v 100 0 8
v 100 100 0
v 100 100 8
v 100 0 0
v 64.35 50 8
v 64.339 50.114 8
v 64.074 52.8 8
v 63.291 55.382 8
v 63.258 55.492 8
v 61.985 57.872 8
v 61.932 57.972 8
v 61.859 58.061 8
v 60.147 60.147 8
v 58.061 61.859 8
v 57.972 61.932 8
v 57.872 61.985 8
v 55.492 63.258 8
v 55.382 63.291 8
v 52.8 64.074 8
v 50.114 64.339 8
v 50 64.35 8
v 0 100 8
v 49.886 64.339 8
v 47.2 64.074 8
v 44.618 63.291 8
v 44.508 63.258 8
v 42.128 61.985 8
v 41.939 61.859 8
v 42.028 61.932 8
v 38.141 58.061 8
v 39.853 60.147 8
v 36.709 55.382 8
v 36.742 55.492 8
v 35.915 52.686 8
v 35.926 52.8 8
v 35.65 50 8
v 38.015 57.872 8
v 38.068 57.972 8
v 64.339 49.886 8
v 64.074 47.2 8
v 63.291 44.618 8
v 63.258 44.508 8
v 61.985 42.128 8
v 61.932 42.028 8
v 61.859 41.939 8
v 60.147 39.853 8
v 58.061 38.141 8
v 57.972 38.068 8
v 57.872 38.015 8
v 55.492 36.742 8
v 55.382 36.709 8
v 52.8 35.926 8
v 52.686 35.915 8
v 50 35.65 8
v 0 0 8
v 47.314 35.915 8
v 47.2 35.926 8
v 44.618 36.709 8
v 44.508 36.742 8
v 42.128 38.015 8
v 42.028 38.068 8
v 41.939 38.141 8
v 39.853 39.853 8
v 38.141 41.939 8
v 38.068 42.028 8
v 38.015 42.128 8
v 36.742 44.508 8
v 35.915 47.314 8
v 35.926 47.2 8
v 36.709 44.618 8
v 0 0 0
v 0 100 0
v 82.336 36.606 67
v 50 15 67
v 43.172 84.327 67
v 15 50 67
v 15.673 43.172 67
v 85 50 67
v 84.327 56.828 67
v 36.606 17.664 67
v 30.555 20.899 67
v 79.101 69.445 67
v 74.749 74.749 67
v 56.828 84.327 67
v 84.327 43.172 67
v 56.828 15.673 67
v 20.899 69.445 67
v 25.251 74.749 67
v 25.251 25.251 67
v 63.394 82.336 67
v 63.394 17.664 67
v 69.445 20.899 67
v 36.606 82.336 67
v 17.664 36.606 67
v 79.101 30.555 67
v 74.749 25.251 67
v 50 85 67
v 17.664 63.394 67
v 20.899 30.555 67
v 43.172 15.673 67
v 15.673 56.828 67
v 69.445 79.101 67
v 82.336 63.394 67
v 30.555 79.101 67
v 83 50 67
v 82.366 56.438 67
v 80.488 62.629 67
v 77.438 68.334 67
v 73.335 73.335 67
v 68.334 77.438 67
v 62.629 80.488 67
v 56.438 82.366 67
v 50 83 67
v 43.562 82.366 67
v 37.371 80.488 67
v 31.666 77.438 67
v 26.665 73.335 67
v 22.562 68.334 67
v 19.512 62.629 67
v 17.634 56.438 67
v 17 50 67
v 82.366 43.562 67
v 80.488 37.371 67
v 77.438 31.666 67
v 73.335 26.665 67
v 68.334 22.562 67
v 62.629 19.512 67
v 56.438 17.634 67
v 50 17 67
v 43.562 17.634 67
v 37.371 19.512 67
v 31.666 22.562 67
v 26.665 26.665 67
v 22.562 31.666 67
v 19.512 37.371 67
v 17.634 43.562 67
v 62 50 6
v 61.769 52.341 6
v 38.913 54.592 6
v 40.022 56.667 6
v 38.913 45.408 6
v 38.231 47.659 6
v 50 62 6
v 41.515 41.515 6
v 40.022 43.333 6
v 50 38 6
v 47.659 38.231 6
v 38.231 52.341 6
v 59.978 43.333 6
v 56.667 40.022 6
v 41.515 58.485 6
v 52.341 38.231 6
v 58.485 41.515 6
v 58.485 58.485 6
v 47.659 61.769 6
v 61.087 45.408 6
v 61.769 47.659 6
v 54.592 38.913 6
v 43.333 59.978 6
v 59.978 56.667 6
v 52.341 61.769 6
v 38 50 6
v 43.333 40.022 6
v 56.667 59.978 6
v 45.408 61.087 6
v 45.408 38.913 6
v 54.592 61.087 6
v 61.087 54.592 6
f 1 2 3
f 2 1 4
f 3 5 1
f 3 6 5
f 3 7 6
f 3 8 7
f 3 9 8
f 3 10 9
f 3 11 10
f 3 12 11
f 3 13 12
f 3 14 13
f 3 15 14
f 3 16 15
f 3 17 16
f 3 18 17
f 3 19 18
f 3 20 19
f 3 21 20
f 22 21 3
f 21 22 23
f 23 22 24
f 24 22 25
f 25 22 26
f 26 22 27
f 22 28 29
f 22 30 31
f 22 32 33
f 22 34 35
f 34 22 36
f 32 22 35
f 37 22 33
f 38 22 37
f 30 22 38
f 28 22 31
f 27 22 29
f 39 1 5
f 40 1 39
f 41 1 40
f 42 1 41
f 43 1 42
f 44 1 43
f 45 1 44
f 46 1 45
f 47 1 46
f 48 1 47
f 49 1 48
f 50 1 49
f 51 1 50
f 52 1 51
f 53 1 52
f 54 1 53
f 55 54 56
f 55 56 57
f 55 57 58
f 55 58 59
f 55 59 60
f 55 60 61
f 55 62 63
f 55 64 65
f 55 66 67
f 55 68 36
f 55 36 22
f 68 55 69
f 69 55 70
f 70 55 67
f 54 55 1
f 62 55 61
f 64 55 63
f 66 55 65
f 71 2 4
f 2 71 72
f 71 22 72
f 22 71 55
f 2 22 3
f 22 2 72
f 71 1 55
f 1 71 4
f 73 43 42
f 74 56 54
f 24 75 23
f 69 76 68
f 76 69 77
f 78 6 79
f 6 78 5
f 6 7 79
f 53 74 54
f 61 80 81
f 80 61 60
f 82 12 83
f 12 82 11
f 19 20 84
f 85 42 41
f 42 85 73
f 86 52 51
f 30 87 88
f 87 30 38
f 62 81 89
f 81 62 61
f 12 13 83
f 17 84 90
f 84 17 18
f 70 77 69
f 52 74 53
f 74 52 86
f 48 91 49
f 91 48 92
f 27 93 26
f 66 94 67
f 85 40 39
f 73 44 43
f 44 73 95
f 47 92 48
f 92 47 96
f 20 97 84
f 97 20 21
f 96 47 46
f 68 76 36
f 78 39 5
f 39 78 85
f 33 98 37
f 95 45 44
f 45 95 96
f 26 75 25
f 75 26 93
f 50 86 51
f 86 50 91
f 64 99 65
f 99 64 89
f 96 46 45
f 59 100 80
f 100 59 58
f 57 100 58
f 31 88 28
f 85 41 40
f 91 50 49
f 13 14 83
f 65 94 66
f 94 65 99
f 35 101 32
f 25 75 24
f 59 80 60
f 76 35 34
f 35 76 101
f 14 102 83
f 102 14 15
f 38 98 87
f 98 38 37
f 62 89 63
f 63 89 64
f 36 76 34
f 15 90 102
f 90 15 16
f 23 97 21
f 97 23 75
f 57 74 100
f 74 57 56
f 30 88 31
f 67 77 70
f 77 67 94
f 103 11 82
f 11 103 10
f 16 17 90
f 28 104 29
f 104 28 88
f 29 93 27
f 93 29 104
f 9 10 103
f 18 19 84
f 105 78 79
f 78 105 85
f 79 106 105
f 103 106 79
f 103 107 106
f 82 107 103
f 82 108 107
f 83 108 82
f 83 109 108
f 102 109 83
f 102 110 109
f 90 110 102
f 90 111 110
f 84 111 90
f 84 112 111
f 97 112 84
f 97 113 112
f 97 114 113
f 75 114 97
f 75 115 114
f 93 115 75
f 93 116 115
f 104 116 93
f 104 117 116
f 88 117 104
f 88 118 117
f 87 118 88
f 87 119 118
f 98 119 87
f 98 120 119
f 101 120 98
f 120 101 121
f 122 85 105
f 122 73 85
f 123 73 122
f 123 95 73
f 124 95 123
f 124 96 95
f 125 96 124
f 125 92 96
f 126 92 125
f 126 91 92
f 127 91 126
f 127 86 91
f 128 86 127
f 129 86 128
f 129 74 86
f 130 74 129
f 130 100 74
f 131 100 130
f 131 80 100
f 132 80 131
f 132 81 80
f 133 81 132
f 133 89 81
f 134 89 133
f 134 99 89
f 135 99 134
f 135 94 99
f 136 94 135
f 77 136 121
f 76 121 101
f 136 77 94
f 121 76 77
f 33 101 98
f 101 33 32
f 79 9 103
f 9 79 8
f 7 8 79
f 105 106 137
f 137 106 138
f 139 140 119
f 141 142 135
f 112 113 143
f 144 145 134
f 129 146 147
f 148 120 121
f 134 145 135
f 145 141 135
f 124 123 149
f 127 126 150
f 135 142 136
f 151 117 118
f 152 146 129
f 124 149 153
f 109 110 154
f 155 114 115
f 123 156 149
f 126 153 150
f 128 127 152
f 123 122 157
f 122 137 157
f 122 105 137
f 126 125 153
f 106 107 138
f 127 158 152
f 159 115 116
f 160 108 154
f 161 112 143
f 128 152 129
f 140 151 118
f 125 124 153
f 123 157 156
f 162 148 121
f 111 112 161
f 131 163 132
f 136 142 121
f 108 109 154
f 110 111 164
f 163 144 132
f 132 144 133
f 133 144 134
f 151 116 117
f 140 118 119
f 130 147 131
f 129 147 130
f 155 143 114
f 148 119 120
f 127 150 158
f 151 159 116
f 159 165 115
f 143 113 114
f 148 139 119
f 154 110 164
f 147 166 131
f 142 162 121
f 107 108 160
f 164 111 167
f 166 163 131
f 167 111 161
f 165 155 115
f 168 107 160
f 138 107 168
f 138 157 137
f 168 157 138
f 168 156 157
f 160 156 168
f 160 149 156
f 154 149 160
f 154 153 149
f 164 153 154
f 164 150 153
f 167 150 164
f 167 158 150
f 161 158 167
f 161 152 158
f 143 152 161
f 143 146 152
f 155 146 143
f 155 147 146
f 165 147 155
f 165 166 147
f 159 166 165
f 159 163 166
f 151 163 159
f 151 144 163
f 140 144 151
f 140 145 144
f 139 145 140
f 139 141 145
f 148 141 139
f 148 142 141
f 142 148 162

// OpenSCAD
$fn = 32;

// ----------------------------------------------------------------------
// Hopper: funnel with square flange
// ----------------------------------------------------------------------

// --- parameters (mm) ---
fl = 100;                 // flange side, X and Y
fl_t = 8;                 // flange thickness
cone_h = 60;              // cone height above the flange
top_d = 70;               // cone mouth diameter
bot_d = 28;               // cone spout diameter
wall = 2;                 // cone wall thickness
fit_tol = 0.05;           // tolerance for press fits, mm
free_tol = 0.2;           // tolerance for clearance fits, mm

bore_d = bot_d - 2 * wall;  // spout bore diameter
total_h = fl_t + cone_h - 1;  // overall height

difference() {
  union() {
    cube([fl, fl, fl_t]);
    translate([fl / 2, fl / 2, fl_t - 1])
      cylinder(h = cone_h, d1 = bot_d, d2 = top_d);
  }
  translate([fl / 2, fl / 2, fl_t - 2])
    cylinder(h = cone_h + 1, d1 = bore_d, d2 = top_d - 2 * wall);
}
